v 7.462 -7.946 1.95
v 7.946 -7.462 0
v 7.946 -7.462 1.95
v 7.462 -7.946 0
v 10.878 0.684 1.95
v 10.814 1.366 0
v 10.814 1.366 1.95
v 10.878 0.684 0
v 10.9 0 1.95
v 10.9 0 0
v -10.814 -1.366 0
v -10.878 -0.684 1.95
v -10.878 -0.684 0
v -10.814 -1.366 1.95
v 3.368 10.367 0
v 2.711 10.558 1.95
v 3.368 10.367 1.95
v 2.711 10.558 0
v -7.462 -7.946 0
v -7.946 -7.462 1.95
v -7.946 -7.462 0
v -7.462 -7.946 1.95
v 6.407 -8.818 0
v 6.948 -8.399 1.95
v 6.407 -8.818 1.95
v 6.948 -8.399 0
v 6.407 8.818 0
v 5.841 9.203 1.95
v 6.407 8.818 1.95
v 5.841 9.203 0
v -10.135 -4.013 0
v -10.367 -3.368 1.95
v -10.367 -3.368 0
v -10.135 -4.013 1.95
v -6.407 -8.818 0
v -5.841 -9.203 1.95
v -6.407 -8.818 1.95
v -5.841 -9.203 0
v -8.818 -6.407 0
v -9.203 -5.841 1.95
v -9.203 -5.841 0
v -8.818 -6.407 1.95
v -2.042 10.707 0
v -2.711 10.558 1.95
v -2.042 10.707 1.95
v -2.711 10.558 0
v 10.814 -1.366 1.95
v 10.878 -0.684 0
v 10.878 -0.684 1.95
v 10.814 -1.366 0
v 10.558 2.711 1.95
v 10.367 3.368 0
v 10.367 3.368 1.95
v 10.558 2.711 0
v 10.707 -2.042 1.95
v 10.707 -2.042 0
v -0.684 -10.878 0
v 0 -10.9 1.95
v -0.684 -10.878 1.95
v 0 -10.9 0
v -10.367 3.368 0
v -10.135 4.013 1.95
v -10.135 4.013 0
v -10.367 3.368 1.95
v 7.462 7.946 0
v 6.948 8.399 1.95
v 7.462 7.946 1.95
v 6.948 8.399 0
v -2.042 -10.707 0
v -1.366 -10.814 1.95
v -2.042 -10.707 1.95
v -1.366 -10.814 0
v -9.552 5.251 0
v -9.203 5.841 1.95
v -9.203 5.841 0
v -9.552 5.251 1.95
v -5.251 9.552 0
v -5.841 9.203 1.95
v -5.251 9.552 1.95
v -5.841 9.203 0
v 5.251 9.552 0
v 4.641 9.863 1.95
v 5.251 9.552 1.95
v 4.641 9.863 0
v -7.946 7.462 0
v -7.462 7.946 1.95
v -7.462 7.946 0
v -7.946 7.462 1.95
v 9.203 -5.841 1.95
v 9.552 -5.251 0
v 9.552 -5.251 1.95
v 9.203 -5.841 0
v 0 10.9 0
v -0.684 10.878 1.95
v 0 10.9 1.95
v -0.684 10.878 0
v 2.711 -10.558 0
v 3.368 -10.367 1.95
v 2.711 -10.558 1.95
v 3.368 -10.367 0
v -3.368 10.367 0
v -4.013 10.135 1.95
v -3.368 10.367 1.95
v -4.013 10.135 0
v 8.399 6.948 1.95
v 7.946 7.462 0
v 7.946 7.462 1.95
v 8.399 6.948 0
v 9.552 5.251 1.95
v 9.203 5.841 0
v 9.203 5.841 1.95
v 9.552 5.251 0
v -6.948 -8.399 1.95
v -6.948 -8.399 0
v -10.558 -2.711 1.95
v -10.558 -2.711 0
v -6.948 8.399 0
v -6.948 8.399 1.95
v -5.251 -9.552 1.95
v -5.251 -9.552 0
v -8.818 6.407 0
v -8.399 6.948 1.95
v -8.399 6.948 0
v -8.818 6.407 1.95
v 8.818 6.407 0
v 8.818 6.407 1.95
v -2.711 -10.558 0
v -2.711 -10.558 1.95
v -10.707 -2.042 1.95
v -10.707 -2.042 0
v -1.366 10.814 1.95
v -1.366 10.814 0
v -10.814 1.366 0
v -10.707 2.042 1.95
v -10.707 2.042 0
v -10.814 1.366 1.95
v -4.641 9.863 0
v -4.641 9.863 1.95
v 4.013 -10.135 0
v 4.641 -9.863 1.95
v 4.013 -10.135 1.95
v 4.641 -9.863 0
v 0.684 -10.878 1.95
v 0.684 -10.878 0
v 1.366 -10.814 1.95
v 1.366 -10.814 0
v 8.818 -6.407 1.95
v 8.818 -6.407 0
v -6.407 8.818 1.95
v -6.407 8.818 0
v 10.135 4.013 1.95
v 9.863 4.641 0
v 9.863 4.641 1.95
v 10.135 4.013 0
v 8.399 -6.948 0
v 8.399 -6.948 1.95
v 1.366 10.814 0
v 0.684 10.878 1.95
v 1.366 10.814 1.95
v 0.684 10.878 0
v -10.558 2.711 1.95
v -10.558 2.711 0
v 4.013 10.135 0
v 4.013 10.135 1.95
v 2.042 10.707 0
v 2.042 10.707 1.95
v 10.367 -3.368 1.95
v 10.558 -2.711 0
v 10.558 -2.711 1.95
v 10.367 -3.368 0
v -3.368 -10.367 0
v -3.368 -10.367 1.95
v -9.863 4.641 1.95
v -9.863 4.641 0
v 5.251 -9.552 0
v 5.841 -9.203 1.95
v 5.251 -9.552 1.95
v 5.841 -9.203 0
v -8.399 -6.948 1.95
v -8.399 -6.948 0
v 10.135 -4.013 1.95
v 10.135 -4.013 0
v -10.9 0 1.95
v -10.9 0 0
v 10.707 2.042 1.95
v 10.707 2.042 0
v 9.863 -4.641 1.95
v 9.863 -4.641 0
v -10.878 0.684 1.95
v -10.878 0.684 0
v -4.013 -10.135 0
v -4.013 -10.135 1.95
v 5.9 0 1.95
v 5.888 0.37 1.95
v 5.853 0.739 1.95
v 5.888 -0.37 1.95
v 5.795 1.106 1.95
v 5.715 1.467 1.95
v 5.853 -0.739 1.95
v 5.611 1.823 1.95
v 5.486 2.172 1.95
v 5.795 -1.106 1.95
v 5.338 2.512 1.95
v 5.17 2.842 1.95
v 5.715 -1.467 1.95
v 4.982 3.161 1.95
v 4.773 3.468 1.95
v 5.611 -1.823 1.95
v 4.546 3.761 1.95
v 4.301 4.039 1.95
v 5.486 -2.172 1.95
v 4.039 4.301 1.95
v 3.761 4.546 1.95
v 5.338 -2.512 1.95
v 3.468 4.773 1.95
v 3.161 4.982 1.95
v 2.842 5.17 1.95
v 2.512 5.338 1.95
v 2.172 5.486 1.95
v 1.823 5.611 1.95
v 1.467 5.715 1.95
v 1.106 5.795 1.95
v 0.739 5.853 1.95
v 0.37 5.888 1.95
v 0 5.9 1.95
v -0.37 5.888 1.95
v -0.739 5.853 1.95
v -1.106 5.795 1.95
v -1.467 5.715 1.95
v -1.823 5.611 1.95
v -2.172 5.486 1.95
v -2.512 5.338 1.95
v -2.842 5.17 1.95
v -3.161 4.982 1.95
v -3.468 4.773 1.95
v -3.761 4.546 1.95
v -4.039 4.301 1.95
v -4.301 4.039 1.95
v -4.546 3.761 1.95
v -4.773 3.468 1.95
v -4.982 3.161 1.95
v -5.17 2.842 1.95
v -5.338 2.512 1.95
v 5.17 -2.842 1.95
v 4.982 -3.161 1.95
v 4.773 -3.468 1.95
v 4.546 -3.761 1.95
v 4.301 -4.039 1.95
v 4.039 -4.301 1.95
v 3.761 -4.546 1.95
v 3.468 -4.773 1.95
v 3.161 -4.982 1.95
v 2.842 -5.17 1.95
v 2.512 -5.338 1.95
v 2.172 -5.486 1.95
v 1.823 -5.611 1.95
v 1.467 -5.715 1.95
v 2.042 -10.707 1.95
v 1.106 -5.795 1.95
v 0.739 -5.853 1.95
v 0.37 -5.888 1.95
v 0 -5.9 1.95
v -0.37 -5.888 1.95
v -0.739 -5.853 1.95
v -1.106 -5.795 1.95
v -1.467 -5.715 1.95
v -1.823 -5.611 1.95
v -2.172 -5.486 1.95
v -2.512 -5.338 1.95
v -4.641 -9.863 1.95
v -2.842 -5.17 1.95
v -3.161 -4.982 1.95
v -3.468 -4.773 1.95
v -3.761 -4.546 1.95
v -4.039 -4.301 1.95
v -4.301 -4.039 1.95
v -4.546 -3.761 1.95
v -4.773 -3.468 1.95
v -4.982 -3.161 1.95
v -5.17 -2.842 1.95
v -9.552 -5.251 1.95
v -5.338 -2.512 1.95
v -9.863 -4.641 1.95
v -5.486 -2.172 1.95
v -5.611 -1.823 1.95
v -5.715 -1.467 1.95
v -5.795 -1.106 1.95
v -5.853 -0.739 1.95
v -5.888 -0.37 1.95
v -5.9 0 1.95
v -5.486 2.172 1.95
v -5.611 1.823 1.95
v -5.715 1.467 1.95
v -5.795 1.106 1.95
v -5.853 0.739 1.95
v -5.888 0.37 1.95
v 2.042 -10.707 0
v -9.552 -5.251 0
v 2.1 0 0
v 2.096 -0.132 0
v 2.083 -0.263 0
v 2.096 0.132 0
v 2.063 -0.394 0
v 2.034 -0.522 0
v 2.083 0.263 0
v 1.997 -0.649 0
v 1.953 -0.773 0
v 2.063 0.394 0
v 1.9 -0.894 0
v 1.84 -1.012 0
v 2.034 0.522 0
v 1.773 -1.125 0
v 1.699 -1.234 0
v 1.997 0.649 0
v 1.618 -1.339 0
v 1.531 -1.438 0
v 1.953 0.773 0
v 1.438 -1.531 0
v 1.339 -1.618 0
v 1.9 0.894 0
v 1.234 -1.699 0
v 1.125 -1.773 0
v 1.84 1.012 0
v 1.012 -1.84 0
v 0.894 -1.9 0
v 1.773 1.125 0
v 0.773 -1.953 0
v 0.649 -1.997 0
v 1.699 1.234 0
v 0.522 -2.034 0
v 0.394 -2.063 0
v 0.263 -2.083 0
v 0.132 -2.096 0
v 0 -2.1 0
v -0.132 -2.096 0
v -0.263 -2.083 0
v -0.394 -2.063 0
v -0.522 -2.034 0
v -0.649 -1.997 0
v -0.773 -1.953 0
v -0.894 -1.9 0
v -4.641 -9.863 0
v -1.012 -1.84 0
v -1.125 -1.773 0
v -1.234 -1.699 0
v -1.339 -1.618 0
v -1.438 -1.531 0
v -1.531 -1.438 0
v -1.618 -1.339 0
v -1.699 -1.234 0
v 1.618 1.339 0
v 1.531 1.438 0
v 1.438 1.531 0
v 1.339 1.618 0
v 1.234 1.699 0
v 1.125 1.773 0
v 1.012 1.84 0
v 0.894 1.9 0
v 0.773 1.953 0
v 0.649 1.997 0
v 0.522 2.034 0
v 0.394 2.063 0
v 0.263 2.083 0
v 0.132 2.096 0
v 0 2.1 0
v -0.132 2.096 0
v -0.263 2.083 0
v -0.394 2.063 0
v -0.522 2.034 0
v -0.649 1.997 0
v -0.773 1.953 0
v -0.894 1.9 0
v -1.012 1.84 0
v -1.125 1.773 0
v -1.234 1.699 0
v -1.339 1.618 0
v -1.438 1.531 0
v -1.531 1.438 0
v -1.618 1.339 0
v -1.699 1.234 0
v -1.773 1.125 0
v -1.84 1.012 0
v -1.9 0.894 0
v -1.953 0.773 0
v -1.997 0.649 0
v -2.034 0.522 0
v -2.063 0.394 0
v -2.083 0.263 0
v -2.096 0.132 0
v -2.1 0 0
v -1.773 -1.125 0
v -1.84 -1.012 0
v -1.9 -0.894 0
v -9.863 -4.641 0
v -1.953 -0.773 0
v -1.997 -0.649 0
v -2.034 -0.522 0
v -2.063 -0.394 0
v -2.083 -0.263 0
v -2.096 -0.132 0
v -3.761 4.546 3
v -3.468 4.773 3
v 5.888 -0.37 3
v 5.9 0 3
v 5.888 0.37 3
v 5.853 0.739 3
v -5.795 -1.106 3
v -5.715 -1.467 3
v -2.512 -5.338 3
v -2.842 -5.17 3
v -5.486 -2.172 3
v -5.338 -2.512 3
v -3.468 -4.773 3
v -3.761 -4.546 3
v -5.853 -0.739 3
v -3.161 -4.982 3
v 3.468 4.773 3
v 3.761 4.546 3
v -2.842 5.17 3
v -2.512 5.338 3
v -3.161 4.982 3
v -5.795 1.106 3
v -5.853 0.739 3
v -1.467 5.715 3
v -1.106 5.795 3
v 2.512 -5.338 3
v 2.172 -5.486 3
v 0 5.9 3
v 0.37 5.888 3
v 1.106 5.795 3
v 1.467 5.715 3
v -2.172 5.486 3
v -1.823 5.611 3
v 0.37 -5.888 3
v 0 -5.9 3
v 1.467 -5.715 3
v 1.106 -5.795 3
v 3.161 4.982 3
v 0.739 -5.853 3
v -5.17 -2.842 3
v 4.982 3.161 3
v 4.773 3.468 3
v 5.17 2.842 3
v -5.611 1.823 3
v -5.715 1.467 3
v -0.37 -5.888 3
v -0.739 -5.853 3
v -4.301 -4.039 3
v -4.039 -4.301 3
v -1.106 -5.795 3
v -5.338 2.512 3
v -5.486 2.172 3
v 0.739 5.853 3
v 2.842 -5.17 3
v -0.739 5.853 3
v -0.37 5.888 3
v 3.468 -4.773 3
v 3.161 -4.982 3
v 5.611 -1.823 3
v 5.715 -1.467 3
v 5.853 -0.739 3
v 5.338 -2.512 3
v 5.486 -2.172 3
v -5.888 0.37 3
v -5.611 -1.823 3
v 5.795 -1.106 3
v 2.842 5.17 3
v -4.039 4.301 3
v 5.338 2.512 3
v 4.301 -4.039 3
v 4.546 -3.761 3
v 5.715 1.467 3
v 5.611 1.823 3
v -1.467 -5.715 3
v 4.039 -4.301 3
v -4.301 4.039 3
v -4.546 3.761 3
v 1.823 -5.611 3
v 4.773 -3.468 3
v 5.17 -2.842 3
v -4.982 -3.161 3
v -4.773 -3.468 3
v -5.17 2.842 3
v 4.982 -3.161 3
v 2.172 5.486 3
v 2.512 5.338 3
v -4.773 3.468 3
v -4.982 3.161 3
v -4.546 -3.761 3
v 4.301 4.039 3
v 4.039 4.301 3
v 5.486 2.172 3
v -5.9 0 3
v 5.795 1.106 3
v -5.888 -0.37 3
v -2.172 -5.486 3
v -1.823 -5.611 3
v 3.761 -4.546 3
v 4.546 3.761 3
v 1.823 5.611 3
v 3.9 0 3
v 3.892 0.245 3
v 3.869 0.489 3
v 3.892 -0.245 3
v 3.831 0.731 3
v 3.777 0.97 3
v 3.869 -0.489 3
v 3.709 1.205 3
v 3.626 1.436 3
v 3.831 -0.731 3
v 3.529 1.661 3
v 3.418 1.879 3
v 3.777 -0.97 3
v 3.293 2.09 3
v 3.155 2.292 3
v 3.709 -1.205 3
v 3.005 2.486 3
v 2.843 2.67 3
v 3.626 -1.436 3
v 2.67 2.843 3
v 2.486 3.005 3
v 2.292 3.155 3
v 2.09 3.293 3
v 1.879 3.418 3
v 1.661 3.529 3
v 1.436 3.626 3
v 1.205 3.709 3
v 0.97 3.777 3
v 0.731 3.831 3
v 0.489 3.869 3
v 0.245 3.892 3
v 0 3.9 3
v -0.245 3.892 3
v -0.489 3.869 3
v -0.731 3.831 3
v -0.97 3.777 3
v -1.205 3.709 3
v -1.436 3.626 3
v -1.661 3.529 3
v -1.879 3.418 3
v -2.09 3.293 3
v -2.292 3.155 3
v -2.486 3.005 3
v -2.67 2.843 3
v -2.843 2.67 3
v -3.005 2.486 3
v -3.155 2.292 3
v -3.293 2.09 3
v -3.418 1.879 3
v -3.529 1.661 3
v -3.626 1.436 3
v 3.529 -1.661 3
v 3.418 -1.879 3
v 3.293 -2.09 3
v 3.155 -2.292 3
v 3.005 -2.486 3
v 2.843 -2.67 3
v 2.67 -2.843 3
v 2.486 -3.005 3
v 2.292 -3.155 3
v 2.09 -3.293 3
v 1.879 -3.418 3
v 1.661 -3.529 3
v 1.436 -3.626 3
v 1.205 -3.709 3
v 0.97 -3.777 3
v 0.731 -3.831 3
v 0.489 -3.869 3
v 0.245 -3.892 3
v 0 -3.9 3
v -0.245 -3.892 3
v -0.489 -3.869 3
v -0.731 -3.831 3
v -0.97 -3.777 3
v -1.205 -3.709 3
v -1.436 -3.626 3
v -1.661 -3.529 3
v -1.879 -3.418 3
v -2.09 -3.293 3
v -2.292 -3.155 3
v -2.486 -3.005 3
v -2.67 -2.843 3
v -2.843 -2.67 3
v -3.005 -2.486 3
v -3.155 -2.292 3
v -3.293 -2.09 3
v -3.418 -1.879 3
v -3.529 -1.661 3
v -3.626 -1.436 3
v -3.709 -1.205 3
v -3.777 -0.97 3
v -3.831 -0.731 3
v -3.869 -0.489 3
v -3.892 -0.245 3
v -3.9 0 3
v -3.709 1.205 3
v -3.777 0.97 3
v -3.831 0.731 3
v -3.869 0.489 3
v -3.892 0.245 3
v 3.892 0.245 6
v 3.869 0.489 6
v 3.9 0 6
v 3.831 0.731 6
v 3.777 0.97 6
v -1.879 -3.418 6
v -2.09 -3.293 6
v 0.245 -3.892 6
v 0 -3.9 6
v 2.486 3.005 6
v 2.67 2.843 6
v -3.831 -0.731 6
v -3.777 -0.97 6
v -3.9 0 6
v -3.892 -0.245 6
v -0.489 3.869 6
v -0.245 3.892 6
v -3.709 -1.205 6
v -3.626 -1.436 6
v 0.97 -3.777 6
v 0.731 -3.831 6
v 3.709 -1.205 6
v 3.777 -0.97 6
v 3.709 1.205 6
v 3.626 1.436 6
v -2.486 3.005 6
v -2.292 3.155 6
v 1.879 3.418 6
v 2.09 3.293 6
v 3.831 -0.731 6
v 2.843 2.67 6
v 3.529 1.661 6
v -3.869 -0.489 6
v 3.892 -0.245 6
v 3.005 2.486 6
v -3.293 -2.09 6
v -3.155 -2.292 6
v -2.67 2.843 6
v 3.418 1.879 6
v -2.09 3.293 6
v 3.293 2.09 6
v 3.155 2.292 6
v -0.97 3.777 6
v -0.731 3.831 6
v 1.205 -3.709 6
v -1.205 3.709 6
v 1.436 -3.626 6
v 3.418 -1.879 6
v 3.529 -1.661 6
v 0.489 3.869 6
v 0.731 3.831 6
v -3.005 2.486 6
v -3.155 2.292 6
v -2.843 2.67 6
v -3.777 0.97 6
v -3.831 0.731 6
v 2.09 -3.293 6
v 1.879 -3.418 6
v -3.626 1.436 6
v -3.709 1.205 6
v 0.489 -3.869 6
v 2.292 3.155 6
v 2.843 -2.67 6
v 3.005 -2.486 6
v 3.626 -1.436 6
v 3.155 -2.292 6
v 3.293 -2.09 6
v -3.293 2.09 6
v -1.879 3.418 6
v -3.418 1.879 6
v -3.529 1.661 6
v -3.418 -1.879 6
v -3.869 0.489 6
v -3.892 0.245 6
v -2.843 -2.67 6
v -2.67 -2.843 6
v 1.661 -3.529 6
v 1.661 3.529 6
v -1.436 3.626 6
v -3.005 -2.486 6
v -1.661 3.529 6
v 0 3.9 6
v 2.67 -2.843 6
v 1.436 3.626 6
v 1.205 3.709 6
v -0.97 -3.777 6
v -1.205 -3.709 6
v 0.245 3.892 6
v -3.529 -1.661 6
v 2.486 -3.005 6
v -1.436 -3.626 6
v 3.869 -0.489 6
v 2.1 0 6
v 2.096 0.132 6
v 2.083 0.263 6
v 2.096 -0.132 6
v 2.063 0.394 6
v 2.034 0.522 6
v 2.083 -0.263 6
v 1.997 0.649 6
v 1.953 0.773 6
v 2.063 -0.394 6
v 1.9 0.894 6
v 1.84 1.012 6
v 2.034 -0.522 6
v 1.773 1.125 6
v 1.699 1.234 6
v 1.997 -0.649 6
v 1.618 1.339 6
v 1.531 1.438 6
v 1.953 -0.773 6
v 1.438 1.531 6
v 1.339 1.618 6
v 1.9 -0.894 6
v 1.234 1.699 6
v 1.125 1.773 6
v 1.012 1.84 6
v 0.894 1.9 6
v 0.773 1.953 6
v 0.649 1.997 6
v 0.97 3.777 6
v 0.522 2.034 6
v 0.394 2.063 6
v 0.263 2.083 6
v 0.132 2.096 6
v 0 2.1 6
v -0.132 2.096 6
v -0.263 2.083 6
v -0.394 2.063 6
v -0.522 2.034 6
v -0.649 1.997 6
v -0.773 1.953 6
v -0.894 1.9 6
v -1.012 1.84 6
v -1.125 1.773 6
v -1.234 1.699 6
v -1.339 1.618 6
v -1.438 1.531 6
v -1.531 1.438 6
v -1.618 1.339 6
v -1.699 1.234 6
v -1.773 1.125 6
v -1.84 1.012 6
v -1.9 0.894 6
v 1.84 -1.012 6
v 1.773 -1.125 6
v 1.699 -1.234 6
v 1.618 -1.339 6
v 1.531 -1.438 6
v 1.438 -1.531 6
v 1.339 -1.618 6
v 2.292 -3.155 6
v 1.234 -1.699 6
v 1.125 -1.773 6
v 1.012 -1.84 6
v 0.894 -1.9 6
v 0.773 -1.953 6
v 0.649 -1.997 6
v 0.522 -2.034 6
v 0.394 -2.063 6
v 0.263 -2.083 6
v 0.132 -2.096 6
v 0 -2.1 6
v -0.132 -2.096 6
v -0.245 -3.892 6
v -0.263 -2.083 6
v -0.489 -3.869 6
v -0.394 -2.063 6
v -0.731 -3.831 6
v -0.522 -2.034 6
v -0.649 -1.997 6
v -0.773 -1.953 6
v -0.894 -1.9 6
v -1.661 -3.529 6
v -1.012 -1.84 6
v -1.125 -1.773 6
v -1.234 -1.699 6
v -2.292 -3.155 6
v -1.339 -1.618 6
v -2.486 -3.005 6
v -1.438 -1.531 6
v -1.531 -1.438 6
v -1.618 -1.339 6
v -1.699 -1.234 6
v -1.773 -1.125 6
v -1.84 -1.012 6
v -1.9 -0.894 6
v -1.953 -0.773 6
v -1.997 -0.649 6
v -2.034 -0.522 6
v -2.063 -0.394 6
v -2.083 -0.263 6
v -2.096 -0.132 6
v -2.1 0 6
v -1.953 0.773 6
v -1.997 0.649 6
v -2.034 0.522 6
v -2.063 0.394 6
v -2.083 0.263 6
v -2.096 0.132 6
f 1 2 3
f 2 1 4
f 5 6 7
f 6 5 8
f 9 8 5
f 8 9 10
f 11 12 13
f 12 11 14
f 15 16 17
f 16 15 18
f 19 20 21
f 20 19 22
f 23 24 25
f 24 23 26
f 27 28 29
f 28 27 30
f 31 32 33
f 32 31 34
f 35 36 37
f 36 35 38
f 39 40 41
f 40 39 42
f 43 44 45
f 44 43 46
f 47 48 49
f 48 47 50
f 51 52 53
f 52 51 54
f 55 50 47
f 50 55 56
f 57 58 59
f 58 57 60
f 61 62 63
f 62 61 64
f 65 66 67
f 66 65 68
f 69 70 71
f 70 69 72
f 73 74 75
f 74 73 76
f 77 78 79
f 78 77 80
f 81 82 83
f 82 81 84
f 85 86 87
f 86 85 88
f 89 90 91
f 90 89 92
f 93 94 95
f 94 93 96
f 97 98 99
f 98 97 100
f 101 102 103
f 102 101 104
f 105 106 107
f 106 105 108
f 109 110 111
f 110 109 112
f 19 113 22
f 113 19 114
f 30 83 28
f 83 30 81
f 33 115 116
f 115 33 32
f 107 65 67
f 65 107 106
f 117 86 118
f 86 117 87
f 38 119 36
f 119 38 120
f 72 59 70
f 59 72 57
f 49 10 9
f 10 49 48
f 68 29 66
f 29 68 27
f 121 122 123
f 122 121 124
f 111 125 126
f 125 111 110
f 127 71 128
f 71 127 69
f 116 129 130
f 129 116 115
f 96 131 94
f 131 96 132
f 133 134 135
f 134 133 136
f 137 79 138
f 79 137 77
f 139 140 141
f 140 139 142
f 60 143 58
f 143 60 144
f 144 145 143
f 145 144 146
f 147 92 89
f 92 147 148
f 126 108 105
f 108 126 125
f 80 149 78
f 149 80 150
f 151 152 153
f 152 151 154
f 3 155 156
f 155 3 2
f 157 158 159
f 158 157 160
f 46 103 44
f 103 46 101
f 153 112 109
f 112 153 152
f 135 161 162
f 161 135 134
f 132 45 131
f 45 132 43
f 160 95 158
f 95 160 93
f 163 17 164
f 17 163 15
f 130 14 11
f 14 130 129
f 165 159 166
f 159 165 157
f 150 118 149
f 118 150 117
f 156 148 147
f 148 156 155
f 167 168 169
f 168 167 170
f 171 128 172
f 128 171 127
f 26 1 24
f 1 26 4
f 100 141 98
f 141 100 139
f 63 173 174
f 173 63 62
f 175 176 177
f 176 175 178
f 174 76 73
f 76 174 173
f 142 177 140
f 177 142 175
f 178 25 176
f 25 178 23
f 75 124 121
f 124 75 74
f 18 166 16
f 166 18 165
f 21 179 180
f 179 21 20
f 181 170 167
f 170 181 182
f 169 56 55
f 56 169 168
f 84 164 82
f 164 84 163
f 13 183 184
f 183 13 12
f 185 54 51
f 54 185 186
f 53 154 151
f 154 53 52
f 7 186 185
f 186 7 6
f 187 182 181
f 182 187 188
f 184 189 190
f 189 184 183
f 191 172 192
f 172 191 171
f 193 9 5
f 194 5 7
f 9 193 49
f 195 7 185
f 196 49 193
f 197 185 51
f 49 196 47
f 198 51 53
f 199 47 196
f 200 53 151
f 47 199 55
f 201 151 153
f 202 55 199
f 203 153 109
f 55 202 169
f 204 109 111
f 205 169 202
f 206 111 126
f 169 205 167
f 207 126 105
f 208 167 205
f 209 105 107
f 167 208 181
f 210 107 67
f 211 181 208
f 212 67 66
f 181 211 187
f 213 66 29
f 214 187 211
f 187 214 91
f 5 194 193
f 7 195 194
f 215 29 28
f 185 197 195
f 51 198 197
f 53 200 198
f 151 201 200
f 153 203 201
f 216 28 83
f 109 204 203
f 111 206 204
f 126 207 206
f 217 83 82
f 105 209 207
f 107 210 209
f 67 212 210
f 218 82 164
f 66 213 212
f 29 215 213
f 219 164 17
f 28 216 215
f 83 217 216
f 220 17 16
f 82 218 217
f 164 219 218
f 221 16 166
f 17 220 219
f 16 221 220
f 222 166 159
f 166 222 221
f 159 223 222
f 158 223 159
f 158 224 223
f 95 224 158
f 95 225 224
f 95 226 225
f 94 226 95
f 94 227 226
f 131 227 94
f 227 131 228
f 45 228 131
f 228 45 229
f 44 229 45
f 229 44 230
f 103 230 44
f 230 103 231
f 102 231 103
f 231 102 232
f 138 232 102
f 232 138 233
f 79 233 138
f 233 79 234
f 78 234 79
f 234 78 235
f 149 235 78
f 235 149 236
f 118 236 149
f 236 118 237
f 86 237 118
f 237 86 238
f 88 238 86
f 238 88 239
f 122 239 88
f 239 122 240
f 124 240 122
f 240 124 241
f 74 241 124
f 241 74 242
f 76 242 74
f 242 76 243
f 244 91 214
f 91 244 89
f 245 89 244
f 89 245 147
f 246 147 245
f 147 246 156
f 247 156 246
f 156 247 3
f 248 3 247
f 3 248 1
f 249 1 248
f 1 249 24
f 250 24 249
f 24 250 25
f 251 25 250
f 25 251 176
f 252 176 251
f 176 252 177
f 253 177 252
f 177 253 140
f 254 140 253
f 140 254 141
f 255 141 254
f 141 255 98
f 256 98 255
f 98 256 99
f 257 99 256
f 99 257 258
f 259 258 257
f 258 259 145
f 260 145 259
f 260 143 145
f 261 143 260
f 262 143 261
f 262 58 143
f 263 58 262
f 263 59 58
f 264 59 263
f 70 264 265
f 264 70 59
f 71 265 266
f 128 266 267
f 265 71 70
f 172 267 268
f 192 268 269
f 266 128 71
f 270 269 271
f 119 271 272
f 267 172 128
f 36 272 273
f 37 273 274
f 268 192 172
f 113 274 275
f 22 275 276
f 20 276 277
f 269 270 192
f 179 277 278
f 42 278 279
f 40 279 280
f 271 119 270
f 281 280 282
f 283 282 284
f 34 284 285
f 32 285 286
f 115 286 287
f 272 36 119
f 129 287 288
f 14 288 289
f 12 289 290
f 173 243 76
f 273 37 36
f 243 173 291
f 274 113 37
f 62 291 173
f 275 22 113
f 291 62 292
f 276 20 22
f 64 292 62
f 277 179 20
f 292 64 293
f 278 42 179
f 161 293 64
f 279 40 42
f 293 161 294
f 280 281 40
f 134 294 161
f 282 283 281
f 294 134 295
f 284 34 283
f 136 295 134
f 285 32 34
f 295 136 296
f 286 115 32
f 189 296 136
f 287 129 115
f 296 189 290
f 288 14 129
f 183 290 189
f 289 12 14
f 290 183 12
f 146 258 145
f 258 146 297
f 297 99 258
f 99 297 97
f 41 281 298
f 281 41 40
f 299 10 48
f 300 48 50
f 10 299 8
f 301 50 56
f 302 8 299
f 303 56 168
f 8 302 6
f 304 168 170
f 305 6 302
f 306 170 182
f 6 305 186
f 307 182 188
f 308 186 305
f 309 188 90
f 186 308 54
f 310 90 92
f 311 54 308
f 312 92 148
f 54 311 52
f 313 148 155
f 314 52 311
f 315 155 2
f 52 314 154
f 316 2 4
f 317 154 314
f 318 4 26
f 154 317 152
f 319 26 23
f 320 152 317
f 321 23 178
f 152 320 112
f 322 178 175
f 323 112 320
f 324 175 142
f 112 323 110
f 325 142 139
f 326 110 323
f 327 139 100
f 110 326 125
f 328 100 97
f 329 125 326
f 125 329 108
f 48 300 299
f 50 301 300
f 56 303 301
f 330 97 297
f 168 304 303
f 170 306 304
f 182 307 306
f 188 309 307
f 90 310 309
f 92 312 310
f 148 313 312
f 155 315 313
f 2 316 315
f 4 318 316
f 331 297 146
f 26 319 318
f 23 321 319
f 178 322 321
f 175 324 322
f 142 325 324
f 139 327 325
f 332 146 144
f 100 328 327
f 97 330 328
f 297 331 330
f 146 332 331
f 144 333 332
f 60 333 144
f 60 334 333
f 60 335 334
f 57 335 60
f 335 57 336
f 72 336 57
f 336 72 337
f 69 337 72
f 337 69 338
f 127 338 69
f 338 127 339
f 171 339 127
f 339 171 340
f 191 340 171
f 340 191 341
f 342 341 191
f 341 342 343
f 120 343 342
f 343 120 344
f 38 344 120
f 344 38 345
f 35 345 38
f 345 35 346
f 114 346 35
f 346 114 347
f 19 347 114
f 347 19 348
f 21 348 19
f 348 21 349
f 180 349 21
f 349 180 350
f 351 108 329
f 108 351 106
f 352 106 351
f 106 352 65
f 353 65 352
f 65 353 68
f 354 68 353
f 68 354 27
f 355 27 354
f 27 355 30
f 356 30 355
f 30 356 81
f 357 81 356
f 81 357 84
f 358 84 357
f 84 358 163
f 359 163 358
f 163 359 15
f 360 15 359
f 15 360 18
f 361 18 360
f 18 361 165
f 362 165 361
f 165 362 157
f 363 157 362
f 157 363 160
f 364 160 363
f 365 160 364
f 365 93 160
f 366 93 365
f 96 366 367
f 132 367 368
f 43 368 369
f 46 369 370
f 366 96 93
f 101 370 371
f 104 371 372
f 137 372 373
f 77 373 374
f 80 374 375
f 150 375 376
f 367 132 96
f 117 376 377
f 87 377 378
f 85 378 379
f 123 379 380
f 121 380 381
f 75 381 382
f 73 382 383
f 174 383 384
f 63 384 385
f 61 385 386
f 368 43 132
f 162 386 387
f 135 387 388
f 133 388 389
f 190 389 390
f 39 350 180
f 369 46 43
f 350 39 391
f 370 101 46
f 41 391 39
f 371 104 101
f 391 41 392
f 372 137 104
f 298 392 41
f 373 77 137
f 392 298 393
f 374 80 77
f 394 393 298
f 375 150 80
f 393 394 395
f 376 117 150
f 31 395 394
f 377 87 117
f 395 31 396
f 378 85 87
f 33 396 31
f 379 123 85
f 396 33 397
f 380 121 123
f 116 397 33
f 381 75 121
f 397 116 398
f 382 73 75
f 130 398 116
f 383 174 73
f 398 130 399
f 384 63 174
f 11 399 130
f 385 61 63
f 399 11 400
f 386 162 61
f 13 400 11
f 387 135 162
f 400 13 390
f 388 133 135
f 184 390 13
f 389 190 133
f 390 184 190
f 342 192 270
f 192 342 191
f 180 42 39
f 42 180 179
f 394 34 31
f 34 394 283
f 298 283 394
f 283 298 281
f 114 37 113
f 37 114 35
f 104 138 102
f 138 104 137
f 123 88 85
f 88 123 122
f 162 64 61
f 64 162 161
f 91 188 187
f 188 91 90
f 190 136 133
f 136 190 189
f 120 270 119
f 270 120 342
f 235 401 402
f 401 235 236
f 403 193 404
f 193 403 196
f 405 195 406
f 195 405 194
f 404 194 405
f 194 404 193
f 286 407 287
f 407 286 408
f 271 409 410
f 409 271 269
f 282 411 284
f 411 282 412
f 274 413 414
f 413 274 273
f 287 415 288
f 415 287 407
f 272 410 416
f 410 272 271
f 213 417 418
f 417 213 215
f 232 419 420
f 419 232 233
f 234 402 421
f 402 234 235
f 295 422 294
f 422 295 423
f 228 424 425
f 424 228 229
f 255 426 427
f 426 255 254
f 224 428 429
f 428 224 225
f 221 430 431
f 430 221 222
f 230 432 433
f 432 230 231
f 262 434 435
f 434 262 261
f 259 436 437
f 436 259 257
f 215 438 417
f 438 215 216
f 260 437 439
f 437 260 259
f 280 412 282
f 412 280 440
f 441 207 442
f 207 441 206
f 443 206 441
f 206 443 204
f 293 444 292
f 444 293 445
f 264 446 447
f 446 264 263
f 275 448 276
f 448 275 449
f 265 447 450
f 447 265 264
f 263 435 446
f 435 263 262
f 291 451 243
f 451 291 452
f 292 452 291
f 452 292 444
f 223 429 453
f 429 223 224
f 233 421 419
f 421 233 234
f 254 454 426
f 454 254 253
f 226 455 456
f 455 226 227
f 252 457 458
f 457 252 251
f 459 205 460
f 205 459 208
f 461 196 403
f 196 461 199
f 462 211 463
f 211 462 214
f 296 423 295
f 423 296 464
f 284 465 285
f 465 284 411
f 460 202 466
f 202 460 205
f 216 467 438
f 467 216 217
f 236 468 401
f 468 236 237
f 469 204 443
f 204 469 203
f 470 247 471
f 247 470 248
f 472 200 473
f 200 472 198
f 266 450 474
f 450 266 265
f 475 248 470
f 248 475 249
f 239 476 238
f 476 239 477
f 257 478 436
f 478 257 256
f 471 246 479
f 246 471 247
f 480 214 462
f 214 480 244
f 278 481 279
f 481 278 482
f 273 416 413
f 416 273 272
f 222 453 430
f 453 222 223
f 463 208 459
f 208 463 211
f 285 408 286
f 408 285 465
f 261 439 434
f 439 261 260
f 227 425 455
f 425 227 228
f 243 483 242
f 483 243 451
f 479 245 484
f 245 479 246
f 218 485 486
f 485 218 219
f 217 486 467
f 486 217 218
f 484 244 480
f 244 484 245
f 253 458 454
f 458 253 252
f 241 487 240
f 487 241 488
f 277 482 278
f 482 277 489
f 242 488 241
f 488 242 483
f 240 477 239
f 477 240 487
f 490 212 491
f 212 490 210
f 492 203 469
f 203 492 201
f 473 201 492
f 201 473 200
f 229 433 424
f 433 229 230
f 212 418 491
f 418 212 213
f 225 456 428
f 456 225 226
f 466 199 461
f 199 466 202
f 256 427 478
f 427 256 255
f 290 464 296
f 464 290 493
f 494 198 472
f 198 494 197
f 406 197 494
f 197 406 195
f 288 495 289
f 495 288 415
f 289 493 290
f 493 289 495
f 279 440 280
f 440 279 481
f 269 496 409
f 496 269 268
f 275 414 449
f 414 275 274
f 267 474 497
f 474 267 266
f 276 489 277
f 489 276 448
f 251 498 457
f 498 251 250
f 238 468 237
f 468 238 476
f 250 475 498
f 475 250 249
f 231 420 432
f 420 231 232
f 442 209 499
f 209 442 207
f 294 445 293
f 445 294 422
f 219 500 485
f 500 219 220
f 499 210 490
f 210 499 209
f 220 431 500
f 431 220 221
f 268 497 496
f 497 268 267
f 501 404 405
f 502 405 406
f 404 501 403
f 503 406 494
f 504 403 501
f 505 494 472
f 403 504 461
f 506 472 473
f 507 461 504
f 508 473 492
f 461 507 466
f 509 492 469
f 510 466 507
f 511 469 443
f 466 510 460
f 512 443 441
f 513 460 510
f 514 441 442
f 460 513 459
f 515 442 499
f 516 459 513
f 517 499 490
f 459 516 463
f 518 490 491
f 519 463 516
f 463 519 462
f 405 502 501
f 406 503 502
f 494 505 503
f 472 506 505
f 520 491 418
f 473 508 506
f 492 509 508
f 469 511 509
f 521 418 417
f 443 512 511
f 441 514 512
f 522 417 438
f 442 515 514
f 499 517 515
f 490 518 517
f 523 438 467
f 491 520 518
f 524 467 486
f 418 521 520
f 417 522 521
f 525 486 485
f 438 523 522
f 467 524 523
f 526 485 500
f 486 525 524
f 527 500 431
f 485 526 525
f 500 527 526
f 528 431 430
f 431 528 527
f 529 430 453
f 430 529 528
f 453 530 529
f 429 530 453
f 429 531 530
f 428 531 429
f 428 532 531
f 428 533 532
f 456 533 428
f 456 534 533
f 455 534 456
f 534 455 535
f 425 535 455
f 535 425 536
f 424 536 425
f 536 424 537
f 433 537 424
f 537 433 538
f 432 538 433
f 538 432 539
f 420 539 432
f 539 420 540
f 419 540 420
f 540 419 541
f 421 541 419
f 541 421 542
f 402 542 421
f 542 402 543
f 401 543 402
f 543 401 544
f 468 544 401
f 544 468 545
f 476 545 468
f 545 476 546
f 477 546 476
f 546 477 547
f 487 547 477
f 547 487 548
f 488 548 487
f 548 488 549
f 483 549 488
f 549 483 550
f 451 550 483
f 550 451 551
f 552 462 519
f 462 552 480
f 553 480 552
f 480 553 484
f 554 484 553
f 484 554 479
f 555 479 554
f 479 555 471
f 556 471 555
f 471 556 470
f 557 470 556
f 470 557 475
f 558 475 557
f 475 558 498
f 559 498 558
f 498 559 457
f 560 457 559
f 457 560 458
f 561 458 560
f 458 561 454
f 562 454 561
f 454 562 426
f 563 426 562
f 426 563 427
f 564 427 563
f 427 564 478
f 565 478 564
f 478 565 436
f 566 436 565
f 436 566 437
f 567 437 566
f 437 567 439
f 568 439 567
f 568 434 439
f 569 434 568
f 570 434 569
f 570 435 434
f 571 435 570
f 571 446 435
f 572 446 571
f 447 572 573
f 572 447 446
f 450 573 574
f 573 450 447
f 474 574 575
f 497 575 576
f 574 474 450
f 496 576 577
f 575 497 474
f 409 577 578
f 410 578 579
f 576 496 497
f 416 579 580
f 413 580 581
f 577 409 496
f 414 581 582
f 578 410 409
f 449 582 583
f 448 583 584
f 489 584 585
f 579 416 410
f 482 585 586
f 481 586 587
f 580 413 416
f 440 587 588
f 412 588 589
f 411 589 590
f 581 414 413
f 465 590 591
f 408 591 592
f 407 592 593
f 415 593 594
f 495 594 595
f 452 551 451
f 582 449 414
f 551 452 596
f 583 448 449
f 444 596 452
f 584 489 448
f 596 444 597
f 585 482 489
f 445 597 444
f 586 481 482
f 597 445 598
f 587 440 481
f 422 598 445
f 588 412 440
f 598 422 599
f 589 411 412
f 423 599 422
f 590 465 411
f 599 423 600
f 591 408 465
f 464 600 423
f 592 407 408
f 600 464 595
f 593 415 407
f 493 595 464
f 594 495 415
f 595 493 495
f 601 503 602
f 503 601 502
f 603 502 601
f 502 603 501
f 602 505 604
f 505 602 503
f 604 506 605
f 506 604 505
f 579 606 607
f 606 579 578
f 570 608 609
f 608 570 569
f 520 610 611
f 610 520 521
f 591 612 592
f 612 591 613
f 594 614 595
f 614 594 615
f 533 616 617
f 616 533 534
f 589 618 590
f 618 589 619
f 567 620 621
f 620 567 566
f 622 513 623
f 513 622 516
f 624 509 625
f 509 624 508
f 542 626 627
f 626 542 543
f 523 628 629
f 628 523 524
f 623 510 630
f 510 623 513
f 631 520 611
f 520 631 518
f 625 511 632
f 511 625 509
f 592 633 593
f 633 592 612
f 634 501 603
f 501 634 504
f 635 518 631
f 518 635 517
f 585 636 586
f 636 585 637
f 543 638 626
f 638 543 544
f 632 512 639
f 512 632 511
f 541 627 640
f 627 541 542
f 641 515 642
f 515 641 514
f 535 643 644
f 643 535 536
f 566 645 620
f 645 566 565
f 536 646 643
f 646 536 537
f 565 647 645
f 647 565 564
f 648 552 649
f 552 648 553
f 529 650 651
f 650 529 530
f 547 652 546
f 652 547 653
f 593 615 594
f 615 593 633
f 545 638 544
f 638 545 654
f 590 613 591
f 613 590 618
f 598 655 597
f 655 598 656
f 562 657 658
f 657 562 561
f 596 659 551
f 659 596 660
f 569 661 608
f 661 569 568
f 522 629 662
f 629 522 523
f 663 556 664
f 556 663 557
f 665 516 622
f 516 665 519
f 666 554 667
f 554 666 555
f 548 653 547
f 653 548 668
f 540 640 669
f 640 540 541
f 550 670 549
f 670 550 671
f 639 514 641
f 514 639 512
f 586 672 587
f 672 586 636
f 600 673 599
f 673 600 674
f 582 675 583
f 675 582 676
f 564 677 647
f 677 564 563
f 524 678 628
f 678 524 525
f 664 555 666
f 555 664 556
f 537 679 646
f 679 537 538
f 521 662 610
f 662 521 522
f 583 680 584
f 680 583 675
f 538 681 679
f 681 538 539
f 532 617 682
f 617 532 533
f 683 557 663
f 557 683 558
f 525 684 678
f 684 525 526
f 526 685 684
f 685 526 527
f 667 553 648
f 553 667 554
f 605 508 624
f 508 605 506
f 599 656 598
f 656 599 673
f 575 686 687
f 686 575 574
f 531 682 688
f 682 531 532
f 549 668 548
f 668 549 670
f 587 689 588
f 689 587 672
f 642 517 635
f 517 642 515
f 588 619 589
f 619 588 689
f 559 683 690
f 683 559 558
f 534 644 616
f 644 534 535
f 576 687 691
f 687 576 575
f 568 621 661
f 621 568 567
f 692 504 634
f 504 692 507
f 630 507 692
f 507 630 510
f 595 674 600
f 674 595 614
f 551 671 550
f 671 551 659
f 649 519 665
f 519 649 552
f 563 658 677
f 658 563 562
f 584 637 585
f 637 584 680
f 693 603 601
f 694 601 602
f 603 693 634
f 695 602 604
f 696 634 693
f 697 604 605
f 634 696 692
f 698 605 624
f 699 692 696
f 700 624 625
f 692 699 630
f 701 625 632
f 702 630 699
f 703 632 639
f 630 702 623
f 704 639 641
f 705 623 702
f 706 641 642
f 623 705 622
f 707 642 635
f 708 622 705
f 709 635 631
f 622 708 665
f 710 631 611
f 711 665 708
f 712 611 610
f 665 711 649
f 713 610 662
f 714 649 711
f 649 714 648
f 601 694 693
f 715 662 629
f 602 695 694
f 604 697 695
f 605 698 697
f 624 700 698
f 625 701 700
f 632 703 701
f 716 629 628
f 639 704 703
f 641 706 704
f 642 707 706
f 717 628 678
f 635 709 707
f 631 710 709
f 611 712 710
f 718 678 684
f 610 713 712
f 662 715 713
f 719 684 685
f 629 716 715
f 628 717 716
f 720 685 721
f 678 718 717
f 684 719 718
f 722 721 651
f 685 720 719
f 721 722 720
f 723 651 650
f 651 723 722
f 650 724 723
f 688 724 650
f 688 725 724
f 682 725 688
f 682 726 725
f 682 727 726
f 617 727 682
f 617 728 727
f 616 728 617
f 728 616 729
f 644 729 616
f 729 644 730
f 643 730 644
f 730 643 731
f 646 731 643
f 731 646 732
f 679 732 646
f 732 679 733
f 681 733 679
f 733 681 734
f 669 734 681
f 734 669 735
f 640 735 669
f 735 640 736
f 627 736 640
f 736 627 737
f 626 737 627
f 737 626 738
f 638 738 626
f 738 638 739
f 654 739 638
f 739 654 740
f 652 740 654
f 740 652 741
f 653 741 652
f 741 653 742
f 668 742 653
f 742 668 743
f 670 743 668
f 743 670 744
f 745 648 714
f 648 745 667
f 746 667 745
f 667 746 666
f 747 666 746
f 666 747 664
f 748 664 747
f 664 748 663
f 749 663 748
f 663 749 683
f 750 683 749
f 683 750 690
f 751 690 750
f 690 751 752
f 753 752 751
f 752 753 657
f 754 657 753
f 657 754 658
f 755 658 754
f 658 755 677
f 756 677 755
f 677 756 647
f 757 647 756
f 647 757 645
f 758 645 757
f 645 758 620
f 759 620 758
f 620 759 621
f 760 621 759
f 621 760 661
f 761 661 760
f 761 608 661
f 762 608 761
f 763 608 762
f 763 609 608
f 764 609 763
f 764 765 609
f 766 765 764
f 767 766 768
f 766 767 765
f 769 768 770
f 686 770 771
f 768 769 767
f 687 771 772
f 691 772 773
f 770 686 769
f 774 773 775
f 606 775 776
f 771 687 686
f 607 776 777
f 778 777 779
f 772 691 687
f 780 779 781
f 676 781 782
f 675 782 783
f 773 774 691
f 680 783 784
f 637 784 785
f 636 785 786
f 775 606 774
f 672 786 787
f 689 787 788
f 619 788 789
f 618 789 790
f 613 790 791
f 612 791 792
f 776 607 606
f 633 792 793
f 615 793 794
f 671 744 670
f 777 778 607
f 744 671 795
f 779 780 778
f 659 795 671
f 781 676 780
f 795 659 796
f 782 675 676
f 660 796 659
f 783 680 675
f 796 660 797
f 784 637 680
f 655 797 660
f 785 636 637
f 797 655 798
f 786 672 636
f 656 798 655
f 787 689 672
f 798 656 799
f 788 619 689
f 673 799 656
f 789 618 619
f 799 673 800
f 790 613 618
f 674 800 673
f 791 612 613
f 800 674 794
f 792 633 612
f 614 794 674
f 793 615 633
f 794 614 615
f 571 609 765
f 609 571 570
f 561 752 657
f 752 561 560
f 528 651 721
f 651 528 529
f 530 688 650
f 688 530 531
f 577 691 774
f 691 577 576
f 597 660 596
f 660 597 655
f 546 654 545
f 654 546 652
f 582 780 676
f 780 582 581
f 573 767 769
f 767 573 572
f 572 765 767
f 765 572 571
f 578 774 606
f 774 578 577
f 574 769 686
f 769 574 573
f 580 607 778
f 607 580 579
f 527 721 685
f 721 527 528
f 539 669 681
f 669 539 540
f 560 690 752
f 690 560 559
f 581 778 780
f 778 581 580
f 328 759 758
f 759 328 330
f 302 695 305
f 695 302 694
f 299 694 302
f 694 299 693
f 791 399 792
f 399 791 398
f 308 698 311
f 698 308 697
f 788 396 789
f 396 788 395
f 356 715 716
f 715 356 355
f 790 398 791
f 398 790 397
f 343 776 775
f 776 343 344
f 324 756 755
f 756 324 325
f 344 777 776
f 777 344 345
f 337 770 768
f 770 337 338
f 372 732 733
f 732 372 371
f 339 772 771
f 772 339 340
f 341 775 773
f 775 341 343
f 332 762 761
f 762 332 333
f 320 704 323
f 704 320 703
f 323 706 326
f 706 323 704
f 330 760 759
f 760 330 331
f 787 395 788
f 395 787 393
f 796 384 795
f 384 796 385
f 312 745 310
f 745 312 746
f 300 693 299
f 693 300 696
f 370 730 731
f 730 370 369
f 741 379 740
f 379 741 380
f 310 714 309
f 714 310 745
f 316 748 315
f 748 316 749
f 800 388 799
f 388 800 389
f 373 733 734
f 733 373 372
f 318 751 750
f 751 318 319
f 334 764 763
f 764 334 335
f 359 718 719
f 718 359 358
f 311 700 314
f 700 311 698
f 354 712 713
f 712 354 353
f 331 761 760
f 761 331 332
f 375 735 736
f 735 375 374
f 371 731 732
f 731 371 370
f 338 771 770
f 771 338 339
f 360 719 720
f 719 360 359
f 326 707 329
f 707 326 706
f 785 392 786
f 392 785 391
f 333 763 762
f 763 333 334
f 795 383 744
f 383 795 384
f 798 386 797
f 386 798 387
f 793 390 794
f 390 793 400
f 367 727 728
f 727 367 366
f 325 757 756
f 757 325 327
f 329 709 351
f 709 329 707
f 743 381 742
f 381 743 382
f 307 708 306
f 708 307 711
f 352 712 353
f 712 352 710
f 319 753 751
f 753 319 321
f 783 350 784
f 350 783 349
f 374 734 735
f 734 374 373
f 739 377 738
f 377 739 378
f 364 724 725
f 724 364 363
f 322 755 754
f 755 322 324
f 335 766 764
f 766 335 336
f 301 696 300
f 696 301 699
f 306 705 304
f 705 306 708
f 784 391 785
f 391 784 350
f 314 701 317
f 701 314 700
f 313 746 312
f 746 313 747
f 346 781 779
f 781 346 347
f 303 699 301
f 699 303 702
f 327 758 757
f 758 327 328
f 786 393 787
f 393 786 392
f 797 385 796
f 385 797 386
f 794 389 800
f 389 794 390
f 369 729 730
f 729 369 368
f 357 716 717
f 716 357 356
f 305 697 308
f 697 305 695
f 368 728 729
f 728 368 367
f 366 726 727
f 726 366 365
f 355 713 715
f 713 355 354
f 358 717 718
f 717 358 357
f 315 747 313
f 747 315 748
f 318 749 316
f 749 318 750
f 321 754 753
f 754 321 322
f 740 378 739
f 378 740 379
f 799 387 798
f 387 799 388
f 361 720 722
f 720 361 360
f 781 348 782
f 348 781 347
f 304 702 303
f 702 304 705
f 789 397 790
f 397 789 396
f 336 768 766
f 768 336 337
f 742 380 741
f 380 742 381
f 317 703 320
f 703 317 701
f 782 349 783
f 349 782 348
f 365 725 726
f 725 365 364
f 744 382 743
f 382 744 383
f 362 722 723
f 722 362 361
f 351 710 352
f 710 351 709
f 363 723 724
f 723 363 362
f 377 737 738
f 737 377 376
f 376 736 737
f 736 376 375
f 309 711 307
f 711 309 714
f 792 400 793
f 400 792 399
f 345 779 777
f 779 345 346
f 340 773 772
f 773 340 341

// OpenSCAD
/* [Spacer] */

//spacer outer diameter
outer_diameter=22;

//spacer inner diameter
inner_diameter=8;

//spacer width (including profil shift)
spacer_width=3;

//profil shift width(in % of spacer width)
profil_shift_width=0.35;//[0:0.05:1]

//profil shift thickness
profil_shift_thickness=2;


/* [Optional Screw Lead] */
//Set option
option=1; //[1:yes,-1:no]

//bearing width
bearing_width=7;

//screw diameter
screw_diameter=4;

/* [Fine Tunning] */
//tolerance (XY compensation)
tolerance=0.1;

//definition
definition=100;//[50:low,100:medium,150:high]


/////////////////////
$fn=definition;

module spacer() {
difference() {
union() {
cylinder(d=outer_diameter-2*tolerance,h=spacer_width*(1 - profil_shift_width));
cylinder(d=inner_diameter + 2*profil_shift_thickness - 2*tolerance, h=spacer_width);
cylinder(d=inner_diameter - 2*tolerance, h=spacer_width + bearing_width/2 - 0.5);
}

if(option==1){
translate([0,0,-1]) cylinder(d=screw_diameter + 2*tolerance, h=spacer_width + bearing_width +2);
}
else {
translate([0,0,-1]) cylinder(d=inner_diameter + 2*tolerance, h=spacer_width + bearing_width +2);
}
}
}



spacer();
